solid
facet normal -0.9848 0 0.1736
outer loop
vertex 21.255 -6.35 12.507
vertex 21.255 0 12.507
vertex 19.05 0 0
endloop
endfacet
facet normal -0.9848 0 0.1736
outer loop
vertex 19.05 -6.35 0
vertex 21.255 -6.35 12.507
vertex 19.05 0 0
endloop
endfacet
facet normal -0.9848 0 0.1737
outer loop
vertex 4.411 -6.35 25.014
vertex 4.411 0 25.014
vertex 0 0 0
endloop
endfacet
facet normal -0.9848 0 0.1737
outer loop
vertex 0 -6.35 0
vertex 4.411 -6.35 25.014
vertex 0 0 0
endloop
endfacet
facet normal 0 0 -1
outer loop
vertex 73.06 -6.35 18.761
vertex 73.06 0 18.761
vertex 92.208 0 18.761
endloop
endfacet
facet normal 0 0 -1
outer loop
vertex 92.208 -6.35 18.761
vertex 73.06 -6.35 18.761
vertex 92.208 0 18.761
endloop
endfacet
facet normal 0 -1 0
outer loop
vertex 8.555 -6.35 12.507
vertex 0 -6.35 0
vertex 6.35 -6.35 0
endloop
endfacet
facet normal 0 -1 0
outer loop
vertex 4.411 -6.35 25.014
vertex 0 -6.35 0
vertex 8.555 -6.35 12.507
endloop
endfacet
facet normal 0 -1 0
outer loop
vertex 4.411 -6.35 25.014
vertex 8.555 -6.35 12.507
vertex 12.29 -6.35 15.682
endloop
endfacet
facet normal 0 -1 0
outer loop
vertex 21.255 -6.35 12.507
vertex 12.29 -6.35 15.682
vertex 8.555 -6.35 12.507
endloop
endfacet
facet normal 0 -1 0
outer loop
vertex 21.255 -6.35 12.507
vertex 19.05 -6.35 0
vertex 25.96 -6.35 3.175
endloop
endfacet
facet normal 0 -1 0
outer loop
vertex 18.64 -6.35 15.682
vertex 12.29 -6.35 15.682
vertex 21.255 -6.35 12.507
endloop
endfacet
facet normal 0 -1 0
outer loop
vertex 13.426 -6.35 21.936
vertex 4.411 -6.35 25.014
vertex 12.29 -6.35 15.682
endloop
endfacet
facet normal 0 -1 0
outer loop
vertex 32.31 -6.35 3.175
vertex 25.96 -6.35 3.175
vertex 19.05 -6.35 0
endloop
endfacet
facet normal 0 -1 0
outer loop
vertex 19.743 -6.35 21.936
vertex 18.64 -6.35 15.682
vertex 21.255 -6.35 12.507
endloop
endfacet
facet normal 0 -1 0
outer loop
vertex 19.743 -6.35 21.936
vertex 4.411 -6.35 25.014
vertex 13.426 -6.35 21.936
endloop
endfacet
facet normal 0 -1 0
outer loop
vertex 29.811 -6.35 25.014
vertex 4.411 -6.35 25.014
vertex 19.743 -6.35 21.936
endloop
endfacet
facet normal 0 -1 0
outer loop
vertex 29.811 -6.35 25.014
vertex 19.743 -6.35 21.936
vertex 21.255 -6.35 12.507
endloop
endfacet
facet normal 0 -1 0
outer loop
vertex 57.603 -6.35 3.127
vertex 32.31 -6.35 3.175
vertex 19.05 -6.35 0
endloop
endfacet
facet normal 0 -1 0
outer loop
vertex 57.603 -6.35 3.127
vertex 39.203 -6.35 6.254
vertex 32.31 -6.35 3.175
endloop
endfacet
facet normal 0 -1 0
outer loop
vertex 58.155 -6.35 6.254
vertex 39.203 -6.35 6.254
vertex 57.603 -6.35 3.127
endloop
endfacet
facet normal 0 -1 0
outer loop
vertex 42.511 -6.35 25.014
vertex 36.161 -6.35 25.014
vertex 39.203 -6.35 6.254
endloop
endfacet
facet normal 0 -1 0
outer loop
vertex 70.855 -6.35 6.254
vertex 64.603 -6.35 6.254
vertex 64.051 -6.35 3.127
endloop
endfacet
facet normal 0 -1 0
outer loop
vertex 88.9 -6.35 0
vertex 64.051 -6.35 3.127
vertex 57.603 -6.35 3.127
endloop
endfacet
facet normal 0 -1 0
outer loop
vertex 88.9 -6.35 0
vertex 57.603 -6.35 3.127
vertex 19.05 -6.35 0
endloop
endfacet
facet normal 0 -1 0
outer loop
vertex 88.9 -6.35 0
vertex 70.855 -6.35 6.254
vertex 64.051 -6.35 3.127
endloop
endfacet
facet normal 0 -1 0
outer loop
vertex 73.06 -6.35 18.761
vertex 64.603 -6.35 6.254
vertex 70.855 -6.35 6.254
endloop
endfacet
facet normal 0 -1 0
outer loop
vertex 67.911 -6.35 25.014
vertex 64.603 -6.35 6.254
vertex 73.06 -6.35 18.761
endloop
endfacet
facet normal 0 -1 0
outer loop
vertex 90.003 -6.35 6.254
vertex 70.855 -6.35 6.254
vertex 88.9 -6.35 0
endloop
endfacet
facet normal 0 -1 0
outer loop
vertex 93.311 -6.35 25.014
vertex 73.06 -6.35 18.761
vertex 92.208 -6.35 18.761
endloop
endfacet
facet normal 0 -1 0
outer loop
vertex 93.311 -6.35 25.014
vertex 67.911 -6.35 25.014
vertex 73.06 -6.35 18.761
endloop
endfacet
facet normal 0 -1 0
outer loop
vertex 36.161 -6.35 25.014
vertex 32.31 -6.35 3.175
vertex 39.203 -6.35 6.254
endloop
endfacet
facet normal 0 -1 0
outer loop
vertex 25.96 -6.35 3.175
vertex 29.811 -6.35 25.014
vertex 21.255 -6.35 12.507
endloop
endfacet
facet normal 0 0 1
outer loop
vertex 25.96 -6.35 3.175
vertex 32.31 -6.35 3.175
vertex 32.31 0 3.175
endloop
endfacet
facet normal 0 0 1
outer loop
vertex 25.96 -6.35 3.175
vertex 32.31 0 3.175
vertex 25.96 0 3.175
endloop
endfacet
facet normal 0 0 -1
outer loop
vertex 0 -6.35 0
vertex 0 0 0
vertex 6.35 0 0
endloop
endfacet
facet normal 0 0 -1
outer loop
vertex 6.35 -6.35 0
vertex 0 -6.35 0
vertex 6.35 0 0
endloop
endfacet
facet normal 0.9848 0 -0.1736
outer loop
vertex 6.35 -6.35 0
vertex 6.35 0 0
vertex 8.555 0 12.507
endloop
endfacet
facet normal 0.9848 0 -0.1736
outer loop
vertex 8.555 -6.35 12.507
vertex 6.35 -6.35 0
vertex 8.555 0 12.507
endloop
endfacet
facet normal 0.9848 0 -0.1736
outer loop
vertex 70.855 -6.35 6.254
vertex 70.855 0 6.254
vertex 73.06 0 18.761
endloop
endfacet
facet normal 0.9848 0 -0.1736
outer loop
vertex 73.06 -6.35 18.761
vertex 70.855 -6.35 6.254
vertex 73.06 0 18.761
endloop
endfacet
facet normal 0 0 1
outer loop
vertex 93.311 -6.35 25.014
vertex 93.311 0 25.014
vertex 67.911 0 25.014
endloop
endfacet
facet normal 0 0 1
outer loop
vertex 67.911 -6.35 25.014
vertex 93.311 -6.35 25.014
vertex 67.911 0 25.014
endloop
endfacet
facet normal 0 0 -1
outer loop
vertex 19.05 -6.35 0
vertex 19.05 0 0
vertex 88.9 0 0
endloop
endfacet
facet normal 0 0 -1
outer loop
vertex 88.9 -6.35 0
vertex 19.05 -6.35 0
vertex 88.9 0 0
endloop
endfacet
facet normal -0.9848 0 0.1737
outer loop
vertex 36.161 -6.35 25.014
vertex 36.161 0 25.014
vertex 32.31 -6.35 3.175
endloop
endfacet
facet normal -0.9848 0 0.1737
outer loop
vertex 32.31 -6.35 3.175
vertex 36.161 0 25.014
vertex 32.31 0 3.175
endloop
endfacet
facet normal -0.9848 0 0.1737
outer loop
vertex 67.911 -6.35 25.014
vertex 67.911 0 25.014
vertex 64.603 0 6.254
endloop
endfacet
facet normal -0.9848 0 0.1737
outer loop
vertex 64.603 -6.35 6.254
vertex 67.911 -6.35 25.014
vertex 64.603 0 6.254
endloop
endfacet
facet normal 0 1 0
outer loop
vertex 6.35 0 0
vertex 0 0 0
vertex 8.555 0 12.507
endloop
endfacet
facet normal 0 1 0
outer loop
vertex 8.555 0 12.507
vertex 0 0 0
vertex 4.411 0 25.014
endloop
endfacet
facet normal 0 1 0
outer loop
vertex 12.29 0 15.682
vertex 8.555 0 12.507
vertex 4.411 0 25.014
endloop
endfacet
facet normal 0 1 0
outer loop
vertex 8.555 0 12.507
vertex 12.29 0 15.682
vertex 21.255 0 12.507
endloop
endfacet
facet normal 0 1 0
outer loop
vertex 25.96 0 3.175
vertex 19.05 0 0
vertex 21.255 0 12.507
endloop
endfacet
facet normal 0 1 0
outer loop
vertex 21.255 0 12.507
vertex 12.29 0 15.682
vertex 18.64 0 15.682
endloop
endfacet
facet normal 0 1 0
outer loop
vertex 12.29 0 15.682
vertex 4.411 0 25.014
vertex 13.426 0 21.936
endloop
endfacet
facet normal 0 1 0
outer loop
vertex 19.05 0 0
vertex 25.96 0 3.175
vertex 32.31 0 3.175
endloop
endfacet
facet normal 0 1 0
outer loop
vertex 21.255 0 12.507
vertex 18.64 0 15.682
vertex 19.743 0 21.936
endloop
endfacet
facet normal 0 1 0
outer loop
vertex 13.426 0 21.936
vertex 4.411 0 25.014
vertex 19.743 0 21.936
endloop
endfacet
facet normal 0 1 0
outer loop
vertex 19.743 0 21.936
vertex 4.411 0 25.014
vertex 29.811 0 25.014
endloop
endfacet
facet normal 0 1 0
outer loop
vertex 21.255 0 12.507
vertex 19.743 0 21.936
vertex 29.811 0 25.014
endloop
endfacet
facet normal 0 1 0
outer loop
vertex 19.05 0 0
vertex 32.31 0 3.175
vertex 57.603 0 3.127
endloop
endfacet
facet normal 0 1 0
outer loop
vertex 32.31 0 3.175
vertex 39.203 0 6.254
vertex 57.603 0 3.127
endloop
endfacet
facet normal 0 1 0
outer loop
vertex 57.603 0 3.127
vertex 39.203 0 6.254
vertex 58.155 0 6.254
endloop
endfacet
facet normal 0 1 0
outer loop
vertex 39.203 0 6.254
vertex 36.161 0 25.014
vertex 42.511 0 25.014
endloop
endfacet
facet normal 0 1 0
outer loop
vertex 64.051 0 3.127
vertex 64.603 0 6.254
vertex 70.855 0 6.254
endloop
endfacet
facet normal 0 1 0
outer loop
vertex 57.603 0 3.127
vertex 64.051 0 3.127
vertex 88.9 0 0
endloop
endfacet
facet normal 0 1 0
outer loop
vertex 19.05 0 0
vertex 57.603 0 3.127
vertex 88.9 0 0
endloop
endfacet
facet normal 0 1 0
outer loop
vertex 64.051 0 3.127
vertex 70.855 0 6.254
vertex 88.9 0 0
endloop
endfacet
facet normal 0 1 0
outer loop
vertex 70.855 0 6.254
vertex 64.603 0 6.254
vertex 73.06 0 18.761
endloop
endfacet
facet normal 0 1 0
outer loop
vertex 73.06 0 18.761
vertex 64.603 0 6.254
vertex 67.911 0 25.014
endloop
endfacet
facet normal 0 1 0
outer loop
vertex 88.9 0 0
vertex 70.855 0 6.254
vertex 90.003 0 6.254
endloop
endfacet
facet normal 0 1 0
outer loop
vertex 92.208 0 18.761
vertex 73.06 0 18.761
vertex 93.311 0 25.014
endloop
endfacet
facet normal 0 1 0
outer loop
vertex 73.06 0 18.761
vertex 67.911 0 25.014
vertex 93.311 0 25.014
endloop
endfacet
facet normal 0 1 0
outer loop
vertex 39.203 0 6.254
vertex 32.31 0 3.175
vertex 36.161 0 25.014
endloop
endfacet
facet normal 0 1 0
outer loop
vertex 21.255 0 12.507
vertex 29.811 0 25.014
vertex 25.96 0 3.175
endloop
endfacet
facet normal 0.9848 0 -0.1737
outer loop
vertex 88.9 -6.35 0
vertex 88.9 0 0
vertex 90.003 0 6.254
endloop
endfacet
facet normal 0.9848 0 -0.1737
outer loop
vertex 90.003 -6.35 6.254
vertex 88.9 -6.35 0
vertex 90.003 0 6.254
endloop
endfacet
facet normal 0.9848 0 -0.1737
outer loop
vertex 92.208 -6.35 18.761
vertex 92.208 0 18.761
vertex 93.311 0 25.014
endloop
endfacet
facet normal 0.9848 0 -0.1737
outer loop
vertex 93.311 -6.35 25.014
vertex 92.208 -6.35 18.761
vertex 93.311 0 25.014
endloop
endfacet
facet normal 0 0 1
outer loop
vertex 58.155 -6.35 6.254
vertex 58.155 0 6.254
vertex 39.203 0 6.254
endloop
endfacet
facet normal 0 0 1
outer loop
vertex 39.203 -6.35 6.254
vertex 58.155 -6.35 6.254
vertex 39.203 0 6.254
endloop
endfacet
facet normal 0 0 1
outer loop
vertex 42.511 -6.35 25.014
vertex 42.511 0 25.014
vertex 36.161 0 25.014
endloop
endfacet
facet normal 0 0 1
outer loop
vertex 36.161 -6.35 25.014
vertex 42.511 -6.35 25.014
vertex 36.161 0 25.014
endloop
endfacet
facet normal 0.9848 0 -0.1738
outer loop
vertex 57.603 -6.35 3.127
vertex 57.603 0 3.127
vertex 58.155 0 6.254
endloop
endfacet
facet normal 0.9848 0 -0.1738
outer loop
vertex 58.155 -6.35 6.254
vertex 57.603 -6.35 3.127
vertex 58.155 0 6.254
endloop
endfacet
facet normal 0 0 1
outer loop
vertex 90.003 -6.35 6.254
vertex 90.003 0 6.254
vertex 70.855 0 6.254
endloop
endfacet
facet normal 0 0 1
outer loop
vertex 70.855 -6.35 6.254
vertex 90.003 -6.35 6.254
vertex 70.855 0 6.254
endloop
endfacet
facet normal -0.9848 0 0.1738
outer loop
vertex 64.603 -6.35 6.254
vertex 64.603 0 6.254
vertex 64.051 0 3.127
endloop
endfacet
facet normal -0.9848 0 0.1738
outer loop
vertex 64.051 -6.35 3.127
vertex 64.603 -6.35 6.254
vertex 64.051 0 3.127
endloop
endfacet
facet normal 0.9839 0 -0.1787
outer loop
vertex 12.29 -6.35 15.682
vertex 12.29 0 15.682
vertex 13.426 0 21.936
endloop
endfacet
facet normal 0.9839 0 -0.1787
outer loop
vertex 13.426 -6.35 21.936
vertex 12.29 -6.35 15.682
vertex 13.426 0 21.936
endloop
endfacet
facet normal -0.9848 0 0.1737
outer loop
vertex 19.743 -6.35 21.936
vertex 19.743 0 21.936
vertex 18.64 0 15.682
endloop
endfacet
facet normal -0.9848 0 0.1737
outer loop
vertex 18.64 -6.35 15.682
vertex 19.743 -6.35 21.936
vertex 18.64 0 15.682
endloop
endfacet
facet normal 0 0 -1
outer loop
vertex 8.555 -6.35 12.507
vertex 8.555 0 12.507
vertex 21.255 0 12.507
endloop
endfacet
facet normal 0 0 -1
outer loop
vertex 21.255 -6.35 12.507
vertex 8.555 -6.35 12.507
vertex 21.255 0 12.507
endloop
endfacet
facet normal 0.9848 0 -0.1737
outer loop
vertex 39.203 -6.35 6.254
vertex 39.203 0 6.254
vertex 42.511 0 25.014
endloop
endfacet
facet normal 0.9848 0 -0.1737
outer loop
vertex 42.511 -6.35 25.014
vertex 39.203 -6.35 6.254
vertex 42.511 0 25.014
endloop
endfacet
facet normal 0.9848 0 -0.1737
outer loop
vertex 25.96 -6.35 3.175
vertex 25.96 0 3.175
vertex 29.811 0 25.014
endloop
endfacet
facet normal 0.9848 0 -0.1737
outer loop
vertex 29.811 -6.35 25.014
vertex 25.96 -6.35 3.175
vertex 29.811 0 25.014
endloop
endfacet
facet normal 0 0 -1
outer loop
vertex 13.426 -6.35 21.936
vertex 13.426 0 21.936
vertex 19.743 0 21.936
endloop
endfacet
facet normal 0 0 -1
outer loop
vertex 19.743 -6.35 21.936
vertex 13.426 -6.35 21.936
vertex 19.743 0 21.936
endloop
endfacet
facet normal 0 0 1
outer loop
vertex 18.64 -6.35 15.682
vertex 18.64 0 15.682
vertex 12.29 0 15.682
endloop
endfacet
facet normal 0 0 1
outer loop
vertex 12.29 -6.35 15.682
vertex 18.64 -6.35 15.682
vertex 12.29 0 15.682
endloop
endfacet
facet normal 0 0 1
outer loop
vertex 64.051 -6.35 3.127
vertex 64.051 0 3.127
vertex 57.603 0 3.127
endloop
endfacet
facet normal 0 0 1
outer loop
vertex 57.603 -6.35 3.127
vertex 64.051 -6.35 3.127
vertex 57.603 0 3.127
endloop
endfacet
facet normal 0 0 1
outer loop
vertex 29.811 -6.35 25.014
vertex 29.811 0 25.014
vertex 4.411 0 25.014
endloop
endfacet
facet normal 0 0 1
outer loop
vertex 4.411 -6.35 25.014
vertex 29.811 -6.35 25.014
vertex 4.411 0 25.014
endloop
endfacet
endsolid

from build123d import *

# Parameters (mm, degrees)
F1_DEPTH = 6.35


with BuildPart() as f1:
    # F0 (on Front) → F1 (new body)
    with BuildSketch(Plane.XZ):
        Polygon((57.603374, 3.126765), (57.052041, 0), (63.5, 0), (64.051333, 3.126765), align=None)
        Polygon((67.910664, 25.014117), (64.602666, 6.253529), (64.051333, 3.126765), (63.5, 0), (88.9, 0), (90.002666, 6.253529), (83.554707, 6.253529), (70.854707, 6.253529), (73.060039, 18.760588), (85.760039, 18.760588), (92.207998, 18.760588), (93.310664, 25.014117), align=None)
        Polygon((4.410664, 25.014117), (0, 0), (6.35, 0), (8.555332, 12.507058), (14.905332, 12.507058), (15.46517, 15.682058), (12.29017, 15.682058), (13.426252, 21.935588), (16.567836, 21.935588), (17.110664, 25.014117), align=None)
        Polygon((42.510664, 25.014117), (36.160664, 25.014117), (32.309838, 3.175), (31.75, 0), (38.1, 0), (39.202666, 6.253529), align=None)
        Polygon((29.810664, 25.014117), (17.110664, 25.014117), (16.567836, 21.935588), (19.742836, 21.935588), (18.64017, 15.682058), (15.46517, 15.682058), (14.905332, 12.507058), (21.255332, 12.507058), (19.05, 0), (25.4, 0), (25.959838, 3.175), align=None)
        Polygon((32.309838, 3.175), (25.959838, 3.175), (25.4, 0), (31.75, 0), align=None)
        Polygon((58.154707, 6.253529), (39.202666, 6.253529), (38.1, 0), (57.052041, 0), (57.603374, 3.126765), align=None)
    extrude(amount=F1_DEPTH)


solid = f1.part
